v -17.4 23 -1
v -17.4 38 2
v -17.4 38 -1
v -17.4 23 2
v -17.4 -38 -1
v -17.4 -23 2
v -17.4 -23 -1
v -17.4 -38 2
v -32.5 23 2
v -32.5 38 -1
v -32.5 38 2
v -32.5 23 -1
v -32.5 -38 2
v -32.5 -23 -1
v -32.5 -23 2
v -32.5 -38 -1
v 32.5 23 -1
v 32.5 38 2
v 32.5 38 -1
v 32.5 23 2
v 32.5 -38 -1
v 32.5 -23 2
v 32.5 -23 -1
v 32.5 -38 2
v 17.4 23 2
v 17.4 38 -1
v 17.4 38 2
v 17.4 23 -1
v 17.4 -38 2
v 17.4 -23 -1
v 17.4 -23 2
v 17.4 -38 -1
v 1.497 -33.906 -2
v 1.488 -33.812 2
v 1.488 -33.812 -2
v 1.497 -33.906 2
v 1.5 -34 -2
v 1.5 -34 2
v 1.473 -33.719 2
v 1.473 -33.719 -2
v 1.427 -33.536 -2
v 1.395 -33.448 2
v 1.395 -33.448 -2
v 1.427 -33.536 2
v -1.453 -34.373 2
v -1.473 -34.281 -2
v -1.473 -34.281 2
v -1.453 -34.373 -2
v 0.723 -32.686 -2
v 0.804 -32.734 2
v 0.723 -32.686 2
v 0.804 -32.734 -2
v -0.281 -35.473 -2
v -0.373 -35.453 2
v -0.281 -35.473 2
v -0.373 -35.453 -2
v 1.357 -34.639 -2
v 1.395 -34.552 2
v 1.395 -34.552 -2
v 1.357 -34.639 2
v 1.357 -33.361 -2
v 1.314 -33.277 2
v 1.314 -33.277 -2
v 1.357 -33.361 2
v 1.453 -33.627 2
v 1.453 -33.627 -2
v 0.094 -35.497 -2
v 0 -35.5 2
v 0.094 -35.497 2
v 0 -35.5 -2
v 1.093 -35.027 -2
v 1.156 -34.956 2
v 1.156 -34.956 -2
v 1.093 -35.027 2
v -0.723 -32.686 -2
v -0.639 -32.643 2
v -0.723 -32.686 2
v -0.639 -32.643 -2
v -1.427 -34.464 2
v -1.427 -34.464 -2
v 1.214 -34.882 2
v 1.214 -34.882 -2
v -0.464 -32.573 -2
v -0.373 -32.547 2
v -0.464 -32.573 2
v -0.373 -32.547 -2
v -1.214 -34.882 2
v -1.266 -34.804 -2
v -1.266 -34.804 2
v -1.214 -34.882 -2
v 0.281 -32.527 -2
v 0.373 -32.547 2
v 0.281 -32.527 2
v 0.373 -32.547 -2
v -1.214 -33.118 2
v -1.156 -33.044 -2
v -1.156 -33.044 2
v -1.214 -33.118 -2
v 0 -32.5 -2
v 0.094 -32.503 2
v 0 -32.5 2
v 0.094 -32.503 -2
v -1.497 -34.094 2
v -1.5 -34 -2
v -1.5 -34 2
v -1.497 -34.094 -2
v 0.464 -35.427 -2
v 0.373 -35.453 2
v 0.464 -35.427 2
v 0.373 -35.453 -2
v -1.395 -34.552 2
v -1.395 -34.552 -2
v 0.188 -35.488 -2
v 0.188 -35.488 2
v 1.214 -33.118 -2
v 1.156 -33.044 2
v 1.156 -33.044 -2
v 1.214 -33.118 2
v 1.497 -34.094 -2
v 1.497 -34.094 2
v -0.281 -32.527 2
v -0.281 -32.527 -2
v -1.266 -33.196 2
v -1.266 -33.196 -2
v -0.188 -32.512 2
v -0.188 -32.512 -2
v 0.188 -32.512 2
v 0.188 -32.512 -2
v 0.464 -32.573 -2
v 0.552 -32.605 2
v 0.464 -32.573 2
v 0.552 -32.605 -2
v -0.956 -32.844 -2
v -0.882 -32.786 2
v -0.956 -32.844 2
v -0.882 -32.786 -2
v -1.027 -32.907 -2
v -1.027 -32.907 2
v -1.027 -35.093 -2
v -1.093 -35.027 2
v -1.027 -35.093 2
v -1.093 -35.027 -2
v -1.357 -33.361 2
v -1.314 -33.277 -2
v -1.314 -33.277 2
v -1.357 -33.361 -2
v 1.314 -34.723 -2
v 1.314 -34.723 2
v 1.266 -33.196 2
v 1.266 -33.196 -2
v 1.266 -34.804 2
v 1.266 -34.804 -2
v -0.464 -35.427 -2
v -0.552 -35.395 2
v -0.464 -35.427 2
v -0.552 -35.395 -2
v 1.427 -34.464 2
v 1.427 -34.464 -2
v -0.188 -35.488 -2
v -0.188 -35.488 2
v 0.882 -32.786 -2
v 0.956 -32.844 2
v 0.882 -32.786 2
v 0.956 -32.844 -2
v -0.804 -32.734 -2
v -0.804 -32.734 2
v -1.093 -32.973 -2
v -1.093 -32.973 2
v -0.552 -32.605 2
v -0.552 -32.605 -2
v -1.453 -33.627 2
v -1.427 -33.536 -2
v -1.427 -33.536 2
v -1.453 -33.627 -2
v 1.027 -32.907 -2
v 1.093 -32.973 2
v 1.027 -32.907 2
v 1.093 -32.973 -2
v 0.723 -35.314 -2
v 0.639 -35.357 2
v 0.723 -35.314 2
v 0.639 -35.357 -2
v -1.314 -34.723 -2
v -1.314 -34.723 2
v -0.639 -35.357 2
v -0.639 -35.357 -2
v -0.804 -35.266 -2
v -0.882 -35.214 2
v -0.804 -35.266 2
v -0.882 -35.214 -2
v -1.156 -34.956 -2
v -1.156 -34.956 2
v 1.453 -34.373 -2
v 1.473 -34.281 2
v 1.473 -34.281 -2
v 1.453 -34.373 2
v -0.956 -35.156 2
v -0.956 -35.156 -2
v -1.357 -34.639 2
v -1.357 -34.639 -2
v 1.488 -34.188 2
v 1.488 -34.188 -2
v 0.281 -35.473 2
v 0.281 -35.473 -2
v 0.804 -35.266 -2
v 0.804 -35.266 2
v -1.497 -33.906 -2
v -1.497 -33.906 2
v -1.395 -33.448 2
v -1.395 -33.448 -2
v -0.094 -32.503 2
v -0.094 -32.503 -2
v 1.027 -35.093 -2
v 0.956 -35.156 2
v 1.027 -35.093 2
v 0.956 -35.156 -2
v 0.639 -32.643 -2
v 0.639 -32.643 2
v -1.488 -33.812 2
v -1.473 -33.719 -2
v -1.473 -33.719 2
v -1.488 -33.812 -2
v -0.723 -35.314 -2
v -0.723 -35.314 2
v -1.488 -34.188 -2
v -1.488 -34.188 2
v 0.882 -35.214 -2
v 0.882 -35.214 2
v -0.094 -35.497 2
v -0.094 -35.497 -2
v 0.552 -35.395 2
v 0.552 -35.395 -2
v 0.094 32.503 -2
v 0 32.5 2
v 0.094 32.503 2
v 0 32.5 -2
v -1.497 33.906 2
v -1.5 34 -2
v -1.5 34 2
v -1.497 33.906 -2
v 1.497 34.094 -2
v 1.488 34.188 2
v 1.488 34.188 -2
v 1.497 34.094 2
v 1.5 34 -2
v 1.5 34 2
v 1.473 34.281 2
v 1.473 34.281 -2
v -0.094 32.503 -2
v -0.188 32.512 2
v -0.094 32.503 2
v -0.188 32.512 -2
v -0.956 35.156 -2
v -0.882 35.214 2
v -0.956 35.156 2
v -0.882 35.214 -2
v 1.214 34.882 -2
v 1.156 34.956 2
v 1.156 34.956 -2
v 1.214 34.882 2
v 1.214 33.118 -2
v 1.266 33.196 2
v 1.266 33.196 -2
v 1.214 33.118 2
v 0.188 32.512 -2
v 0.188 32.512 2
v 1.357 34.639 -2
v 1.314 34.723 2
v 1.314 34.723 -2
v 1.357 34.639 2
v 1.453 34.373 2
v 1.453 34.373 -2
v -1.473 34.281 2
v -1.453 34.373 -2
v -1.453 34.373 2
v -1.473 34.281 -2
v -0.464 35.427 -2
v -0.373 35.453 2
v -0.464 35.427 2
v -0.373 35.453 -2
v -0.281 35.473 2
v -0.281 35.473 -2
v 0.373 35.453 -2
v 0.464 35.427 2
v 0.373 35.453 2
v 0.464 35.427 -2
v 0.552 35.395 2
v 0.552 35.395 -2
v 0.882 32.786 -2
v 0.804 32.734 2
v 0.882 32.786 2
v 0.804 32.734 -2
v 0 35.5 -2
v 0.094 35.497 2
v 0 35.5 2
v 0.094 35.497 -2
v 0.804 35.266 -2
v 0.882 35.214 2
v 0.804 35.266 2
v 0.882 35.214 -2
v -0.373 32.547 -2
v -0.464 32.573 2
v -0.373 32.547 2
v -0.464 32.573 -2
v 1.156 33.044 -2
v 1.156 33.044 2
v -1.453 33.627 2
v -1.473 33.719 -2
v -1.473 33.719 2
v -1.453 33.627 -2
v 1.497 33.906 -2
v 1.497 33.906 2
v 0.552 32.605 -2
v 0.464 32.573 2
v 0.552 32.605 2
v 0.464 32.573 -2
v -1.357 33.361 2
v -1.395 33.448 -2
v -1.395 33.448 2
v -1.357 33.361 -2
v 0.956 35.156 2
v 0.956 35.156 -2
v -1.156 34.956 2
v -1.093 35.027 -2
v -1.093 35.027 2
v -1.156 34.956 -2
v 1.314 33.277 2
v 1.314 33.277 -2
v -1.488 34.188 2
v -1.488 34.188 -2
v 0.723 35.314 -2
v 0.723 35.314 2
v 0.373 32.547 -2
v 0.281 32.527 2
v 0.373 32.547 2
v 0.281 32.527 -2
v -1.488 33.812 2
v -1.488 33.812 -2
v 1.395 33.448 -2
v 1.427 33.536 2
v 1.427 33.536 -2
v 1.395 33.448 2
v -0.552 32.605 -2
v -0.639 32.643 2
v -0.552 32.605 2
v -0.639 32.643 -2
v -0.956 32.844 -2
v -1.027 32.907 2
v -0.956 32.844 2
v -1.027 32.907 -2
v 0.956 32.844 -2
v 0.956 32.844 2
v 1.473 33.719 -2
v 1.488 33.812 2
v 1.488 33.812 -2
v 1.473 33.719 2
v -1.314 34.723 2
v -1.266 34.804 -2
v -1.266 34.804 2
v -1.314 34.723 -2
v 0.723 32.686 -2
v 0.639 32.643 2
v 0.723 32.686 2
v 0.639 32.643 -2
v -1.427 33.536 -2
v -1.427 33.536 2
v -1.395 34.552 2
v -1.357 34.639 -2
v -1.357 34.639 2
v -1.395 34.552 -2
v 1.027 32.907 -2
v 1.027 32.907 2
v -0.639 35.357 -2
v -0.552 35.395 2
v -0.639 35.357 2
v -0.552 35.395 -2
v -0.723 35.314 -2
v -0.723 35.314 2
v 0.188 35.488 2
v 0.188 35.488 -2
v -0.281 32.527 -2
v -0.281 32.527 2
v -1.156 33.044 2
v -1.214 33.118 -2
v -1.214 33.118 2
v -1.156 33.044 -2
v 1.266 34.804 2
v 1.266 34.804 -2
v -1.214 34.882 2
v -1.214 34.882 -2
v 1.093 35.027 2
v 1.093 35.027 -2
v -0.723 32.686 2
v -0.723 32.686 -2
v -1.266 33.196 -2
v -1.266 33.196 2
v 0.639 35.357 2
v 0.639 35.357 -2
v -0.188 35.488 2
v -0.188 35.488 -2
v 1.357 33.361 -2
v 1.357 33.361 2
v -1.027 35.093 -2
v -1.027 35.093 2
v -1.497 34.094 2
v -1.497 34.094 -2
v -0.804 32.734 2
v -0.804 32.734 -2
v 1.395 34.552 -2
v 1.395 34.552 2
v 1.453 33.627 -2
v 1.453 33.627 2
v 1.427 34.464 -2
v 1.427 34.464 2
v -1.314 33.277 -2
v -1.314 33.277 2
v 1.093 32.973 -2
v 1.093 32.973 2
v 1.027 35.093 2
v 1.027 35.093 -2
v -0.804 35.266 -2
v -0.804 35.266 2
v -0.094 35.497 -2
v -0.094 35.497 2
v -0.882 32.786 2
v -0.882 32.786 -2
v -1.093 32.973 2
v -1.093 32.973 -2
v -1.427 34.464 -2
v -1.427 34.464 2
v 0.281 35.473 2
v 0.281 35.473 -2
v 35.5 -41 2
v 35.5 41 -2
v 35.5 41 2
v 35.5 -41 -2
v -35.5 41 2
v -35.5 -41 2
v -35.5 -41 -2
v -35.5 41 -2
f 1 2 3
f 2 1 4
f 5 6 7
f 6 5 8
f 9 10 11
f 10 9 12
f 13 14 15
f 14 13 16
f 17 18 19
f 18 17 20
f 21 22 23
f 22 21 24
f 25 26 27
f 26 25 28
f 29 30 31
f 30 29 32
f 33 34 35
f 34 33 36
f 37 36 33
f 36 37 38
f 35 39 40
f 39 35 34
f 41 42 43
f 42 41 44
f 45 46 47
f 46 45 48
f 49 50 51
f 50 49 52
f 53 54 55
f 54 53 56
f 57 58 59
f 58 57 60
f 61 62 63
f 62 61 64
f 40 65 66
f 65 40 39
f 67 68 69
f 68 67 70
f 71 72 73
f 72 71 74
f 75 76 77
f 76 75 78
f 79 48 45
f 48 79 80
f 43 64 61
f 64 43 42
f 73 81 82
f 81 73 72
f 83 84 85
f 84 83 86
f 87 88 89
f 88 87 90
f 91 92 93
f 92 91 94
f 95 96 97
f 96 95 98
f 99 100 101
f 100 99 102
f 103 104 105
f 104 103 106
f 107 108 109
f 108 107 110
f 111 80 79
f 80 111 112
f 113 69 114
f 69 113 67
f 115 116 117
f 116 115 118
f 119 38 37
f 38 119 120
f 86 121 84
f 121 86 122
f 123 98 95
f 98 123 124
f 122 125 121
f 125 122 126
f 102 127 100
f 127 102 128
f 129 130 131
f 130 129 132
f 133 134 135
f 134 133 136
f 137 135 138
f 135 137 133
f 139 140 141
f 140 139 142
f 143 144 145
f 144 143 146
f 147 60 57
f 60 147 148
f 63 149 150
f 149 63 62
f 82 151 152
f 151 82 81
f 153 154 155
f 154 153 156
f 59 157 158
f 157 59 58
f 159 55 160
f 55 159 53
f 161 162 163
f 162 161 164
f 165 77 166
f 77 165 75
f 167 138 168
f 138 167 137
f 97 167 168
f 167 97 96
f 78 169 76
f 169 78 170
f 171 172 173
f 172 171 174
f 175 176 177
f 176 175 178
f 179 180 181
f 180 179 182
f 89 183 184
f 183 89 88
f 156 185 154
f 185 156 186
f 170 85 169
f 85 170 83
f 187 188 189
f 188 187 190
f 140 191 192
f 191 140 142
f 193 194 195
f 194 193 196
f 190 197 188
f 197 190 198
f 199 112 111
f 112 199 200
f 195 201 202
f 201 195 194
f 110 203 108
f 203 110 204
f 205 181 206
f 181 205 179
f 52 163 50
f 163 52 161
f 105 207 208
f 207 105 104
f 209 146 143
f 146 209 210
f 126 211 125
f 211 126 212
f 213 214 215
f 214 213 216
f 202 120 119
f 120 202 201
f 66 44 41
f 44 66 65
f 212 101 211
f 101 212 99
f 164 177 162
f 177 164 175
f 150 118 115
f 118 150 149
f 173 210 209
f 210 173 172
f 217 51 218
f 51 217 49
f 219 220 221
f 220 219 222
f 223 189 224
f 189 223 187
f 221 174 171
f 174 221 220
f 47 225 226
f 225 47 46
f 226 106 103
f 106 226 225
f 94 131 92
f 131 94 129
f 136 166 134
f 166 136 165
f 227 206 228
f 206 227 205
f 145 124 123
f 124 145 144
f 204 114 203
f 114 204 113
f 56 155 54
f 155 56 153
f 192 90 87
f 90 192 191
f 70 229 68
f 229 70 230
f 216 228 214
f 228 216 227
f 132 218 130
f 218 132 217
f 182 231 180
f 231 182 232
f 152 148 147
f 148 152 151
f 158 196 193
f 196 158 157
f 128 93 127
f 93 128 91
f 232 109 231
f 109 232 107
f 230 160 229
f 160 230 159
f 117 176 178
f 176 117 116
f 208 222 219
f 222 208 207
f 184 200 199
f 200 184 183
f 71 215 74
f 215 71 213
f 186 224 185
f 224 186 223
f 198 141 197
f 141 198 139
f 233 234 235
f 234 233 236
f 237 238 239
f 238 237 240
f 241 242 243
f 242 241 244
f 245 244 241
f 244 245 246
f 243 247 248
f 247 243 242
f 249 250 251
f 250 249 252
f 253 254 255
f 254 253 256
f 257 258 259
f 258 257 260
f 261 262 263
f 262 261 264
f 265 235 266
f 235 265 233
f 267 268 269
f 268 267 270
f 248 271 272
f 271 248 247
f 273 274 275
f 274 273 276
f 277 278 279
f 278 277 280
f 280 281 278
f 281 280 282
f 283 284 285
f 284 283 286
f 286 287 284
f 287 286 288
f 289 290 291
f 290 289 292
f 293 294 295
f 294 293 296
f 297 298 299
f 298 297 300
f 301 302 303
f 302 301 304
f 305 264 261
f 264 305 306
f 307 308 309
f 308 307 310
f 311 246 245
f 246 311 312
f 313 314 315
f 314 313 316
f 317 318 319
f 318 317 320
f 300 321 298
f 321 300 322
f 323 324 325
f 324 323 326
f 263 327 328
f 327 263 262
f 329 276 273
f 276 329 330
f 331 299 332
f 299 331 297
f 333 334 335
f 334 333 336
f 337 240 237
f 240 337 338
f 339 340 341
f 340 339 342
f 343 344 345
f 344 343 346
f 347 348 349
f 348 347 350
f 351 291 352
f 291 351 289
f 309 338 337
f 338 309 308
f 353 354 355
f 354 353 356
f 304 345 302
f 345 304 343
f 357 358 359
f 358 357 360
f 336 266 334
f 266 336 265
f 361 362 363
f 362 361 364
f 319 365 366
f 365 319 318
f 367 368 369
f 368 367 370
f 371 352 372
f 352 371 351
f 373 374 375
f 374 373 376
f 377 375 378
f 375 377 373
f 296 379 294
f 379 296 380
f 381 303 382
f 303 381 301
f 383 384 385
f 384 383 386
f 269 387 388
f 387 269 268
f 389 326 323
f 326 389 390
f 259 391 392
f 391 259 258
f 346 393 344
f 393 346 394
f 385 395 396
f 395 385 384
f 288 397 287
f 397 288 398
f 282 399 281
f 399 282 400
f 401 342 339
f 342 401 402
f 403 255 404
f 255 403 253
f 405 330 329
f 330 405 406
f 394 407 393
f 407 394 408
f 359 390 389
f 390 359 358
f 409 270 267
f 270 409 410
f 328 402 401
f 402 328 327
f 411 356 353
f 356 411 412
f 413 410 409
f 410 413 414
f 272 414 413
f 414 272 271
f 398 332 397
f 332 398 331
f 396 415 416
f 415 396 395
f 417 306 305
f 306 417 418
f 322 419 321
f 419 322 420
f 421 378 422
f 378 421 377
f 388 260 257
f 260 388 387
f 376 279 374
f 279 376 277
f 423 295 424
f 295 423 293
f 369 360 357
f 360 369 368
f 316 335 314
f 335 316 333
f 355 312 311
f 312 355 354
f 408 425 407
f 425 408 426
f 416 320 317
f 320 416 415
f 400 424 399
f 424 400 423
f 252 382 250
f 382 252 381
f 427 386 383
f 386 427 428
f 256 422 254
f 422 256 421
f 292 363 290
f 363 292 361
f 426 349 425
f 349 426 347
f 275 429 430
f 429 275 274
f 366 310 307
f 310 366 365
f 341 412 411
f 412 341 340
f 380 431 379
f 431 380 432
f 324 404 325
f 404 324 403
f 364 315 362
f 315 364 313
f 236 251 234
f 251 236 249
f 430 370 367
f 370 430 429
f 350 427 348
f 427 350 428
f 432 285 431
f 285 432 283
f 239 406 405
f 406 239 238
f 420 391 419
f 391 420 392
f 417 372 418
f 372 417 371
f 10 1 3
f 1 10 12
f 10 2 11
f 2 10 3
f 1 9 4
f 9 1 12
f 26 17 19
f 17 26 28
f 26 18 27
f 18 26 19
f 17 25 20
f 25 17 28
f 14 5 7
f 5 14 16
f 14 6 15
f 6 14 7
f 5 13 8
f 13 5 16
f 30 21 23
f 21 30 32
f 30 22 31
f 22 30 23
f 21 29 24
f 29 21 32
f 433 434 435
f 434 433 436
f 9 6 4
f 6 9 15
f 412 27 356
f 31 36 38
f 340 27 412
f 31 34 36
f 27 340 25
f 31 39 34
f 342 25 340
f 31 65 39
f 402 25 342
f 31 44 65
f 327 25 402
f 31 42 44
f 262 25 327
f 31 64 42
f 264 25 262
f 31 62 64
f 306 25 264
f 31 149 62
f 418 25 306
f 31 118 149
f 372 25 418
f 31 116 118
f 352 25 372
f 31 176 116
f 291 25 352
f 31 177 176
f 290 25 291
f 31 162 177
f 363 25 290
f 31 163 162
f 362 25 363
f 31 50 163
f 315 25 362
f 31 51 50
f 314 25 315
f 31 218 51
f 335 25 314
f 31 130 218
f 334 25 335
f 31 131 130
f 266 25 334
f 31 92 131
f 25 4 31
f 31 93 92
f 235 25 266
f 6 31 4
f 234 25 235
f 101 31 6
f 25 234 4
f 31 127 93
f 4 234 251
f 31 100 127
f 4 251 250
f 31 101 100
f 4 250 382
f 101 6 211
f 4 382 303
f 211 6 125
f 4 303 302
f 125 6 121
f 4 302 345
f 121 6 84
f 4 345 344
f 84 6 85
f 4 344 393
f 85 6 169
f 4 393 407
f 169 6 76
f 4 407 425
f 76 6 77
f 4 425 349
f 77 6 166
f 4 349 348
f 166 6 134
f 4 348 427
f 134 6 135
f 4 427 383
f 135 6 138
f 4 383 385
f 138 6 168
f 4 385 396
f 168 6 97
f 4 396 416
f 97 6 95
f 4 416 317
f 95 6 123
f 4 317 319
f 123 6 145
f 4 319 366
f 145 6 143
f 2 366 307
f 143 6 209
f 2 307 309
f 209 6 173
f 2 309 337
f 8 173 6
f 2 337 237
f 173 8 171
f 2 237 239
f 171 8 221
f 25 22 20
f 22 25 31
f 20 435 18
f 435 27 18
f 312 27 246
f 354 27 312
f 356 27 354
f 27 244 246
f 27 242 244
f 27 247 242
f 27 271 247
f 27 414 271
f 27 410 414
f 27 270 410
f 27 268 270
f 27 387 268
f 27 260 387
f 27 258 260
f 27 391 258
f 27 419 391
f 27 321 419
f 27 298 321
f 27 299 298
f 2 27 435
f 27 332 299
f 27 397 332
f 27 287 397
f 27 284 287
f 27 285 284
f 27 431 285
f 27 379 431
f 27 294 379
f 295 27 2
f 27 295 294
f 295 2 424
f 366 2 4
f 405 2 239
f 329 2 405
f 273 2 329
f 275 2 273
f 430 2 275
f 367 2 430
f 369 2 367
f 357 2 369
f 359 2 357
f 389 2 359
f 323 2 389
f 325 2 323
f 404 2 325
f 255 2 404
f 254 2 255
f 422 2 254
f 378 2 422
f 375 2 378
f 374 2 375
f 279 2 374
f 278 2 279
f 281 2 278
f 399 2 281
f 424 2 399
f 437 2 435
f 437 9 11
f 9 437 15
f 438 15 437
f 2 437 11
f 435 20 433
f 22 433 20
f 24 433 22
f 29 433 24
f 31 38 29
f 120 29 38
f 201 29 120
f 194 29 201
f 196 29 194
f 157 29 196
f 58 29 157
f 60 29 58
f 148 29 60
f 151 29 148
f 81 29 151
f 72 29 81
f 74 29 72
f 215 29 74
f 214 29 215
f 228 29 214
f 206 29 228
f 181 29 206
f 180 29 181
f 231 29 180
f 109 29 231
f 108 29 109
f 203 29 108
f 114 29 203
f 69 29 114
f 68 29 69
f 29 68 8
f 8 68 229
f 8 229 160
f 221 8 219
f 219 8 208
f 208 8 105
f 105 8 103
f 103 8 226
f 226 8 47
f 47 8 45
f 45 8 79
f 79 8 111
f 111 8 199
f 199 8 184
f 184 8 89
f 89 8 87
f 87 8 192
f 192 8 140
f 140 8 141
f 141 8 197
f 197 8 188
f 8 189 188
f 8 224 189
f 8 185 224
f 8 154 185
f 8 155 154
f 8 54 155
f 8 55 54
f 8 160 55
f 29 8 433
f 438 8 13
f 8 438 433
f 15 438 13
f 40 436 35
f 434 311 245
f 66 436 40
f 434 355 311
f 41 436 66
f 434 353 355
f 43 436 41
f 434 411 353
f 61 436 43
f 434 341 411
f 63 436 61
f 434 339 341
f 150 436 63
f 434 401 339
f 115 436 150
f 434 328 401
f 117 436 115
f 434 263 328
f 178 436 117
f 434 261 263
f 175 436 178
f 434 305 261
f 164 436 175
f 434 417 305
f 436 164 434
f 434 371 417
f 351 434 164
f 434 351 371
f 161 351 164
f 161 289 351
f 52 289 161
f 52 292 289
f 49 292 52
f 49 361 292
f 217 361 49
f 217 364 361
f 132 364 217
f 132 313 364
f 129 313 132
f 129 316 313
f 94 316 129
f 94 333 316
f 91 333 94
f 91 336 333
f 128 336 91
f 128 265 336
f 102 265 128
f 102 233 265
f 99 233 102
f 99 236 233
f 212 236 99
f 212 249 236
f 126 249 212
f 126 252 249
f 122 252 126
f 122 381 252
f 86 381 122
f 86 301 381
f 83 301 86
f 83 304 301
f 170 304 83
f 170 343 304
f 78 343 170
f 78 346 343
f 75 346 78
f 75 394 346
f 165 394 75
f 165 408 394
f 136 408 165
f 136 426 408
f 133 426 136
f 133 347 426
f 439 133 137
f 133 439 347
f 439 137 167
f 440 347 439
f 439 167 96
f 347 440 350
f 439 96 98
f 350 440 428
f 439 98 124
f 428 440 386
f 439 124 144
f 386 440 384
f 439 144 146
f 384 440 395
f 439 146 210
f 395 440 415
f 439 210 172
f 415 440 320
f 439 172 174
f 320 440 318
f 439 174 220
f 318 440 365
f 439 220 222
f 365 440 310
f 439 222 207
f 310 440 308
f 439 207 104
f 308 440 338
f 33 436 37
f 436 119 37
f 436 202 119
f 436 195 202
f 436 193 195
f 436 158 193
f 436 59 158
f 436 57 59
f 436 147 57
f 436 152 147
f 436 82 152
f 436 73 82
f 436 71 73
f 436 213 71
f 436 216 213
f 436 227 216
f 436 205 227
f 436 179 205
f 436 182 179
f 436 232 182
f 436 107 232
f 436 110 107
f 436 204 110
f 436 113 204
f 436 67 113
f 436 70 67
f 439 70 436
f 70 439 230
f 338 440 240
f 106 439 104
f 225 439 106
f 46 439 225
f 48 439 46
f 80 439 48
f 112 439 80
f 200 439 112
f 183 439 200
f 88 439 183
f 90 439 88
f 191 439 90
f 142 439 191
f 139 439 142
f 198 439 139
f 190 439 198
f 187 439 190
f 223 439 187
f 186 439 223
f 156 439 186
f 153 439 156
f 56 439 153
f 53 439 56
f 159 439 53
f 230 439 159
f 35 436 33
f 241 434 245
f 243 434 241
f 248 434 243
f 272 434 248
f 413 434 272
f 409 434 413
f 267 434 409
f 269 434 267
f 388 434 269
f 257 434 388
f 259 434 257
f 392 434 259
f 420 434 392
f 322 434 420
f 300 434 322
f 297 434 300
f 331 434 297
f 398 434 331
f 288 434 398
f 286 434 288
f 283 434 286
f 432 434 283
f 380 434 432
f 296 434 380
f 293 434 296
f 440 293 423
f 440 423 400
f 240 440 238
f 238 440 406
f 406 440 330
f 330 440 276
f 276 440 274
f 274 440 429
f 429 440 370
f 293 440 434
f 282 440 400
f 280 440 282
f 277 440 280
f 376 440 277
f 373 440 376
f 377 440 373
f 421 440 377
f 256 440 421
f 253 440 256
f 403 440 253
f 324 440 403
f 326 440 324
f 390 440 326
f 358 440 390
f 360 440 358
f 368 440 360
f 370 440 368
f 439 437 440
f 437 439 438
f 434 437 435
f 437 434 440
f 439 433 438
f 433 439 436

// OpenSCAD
difference(){
	union(){    
        
        
        translate([-71/2,-102/2+10,-2]){
              cube([71,82,4], center=false);
        }
      
        

	}
	union() {
        

       translate([-50,0,8]){
            rotate([0,90,0]){
                cylinder(h=200, r2=1.2, $fn=100, center=false);
            }
        }
       translate([14,100,19]){
            rotate([90,0,0]){
                cylinder(h=200, r2=1.2, $fn=100, center=false);
            }
        }
       translate([-14,100,19]){
            rotate([90,0,0]){
                cylinder(h=200, r2=1.2, $fn=100, center=false);
            }
        }


        translate([-71/2+23,102/2-21-18-5,5]){
            rotate([0,0,20]){
             // cube([1.5,20,30], center=false);
            }
        }
        translate([-71/2+25,102/2-21-18-24,15]){
            rotate([0,0,110]){
           //   cube([1.5,20,30], center=false);
            }
        }
        
        

       translate([0,0,19]){
            rotate([90,45,00]){
                cube([8,8,150], center=true);
            }
        }
       translate([0,0,29]){
            rotate([45,0,0]){
                cube([150,8,8], center=true);
            }
        }

       translate([20,3,29]){
            rotate([0,0,0]){
                cube([40,8,9], center=true);
            }
        }


        translate([-71/2+3,-102/2+3-4,40]){
              cube([15.1,150,100], center=false);
        }
        translate([+71/2-21+2.9,-102/2+3-4,40]){
              cube([15.1,150,100], center=false);
        }


        translate([0,-34,-3]){
            rotate([0,0,0]){
                cylinder(h=200, r=1.5, $fn=100, center=false);
            }
        }           
        translate([0,34,-3]){
            rotate([0,0,0]){
                cylinder(h=200, r=1.5, $fn=100, center=false);
            }
        }           


        translate([-100,-99/2+1.5+7.5+10,40]){
            rotate([0,90,0]){
                cylinder(h=200, r=1.5, $fn=100, center=false);
            }
        }           
        translate([-100,(-99/2+1.5+7.5+10)*-1,40]){
            rotate([0,90,0]){
                cylinder(h=200, r=1.5, $fn=100, center=false);
            }
        }           
        translate([-100,-99/2+1.5+7.5+10,25]){
            rotate([0,90,0]){
                cylinder(h=200, r=1.5, $fn=100, center=false);
            }
        }           
        translate([-100,(-99/2+1.5+7.5+10)*-1,25]){
            rotate([0,90,0]){
                cylinder(h=200, r=1.5, $fn=100, center=false);
            }
        }           



        
        translate([-71/2+3,102/2-21+3-10,-1]){
              cube([15.1,15,100], center=false);
        }
        translate([+71/2-21+2.9,102/2-21+3-10,-1]){
              cube([15.1,15,100], center=false);
        }

        translate([-71/2+3,-102/2+3+10,-1]){
              cube([15.1,15,100], center=false);
        }
        translate([+71/2-21+2.9,-102/2+3+10,-1]){
              cube([15.1,15,100], center=false);
        }
        
        
	}
}
